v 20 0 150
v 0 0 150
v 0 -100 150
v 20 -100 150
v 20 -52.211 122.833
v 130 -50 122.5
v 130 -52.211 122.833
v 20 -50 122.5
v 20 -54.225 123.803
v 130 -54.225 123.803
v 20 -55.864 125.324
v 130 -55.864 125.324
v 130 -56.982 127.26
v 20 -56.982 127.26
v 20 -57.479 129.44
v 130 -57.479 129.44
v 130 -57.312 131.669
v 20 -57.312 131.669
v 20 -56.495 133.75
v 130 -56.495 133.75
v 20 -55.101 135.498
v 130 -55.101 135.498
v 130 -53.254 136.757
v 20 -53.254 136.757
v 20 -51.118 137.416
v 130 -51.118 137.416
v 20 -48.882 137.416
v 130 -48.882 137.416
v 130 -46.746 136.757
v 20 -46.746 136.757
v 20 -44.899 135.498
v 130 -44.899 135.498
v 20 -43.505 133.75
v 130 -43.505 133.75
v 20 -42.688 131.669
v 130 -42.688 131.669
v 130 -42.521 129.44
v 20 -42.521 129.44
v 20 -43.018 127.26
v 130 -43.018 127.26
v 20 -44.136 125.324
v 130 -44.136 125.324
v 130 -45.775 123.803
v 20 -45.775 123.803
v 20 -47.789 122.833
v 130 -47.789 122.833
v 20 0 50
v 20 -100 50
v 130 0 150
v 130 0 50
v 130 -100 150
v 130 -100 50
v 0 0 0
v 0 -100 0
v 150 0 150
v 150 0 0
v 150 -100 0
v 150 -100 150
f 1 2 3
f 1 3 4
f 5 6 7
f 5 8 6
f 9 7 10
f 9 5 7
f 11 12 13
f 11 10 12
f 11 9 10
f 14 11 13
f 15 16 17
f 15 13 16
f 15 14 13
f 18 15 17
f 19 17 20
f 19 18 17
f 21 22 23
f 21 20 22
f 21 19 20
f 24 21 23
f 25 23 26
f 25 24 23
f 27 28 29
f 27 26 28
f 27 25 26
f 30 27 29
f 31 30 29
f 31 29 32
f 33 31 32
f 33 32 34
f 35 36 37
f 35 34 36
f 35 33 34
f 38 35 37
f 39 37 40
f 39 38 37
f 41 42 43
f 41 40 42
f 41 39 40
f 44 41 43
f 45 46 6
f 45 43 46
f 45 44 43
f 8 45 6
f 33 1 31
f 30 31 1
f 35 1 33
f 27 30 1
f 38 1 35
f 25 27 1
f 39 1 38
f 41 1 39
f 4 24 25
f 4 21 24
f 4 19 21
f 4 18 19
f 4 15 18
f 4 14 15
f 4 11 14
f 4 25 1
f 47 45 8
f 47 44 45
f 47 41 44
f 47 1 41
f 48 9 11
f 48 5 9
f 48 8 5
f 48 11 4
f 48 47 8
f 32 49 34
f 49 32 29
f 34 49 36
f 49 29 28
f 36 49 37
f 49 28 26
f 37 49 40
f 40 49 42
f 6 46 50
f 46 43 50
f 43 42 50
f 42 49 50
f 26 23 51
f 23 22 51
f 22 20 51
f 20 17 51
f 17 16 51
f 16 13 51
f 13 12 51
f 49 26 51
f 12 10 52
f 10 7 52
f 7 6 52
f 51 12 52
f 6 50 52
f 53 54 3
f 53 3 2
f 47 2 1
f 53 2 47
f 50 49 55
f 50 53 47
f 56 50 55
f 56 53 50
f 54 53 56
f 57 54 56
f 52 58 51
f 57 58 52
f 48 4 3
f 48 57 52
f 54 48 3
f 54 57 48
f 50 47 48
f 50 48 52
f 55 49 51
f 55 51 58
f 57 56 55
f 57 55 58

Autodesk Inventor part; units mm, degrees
ref_plane "YZ Plane" through (0, 0, 0) normal (1, 0, 0) x (0, 1, 0)
ref_plane "XZ Plane" through (0, 0, 0) normal (0, 1, 0) x (-1, 0, 0)
ref_plane "XY Plane" through (0, 0, 0) normal (0, 0, 1) x (1, 0, 0)
sketch "스케치1" plane through (0, 0, 0) normal (0, 0, 1) x (1, 0, 0)
  line L0 (0, 0) -> (150, 0)
  line L1 (150, 0) -> (150, -100)
  line L2 (150, -100) -> (0, -100)
  line L3 (0, -100) -> (0, 0)
  dimension "d0" = 150
  dimension "d1" = 100
extrude "돌출1" add sketch "스케치1" along normal blind 50
sketch "스케치2" plane through (0, 0, 50) normal (0, 0, 1) x (1, 0, 0)
  line L0 (0, -100) -> (150, -100) projected
  line L1 (150, -100) -> (150, 0) projected
  line L2 (150, 0) -> (0, 0) projected
  line L3 (0, 0) -> (0, -100) projected
  line L4 (20, 0) -> (20, -100)
  line L5 (130, 0) -> (130, -100)
  dimension "d4" = 20
  dimension "d5" = 20
extrude "돌출2" add sketch "스케치2" along normal blind 100 contours L3 L2 L4 L0 | L5 L2 L1 L0
sketch "스케치3" plane through (20, -100, 50) normal (1, 0, 0) x (0, 0, -1)
  line L0 (0, 100) -> (0, 0) projected
  line L1 (0, 100) -> (-100, 100) projected
  line L2 (-100, 0) -> (-100, 100) projected
  line L3 (0, 0) -> (-100, 0) projected
  circle A0 centre (-80, 50) radius 7.5
  point P0 (50, 100)
  dimension "d8" = 15
  dimension "d9" = 20
  dimension "d10" = 50
extrude "돌출3" add sketch "스케치3" along normal up to surface (110 mm away) contours A0
properties part number "lever1"
